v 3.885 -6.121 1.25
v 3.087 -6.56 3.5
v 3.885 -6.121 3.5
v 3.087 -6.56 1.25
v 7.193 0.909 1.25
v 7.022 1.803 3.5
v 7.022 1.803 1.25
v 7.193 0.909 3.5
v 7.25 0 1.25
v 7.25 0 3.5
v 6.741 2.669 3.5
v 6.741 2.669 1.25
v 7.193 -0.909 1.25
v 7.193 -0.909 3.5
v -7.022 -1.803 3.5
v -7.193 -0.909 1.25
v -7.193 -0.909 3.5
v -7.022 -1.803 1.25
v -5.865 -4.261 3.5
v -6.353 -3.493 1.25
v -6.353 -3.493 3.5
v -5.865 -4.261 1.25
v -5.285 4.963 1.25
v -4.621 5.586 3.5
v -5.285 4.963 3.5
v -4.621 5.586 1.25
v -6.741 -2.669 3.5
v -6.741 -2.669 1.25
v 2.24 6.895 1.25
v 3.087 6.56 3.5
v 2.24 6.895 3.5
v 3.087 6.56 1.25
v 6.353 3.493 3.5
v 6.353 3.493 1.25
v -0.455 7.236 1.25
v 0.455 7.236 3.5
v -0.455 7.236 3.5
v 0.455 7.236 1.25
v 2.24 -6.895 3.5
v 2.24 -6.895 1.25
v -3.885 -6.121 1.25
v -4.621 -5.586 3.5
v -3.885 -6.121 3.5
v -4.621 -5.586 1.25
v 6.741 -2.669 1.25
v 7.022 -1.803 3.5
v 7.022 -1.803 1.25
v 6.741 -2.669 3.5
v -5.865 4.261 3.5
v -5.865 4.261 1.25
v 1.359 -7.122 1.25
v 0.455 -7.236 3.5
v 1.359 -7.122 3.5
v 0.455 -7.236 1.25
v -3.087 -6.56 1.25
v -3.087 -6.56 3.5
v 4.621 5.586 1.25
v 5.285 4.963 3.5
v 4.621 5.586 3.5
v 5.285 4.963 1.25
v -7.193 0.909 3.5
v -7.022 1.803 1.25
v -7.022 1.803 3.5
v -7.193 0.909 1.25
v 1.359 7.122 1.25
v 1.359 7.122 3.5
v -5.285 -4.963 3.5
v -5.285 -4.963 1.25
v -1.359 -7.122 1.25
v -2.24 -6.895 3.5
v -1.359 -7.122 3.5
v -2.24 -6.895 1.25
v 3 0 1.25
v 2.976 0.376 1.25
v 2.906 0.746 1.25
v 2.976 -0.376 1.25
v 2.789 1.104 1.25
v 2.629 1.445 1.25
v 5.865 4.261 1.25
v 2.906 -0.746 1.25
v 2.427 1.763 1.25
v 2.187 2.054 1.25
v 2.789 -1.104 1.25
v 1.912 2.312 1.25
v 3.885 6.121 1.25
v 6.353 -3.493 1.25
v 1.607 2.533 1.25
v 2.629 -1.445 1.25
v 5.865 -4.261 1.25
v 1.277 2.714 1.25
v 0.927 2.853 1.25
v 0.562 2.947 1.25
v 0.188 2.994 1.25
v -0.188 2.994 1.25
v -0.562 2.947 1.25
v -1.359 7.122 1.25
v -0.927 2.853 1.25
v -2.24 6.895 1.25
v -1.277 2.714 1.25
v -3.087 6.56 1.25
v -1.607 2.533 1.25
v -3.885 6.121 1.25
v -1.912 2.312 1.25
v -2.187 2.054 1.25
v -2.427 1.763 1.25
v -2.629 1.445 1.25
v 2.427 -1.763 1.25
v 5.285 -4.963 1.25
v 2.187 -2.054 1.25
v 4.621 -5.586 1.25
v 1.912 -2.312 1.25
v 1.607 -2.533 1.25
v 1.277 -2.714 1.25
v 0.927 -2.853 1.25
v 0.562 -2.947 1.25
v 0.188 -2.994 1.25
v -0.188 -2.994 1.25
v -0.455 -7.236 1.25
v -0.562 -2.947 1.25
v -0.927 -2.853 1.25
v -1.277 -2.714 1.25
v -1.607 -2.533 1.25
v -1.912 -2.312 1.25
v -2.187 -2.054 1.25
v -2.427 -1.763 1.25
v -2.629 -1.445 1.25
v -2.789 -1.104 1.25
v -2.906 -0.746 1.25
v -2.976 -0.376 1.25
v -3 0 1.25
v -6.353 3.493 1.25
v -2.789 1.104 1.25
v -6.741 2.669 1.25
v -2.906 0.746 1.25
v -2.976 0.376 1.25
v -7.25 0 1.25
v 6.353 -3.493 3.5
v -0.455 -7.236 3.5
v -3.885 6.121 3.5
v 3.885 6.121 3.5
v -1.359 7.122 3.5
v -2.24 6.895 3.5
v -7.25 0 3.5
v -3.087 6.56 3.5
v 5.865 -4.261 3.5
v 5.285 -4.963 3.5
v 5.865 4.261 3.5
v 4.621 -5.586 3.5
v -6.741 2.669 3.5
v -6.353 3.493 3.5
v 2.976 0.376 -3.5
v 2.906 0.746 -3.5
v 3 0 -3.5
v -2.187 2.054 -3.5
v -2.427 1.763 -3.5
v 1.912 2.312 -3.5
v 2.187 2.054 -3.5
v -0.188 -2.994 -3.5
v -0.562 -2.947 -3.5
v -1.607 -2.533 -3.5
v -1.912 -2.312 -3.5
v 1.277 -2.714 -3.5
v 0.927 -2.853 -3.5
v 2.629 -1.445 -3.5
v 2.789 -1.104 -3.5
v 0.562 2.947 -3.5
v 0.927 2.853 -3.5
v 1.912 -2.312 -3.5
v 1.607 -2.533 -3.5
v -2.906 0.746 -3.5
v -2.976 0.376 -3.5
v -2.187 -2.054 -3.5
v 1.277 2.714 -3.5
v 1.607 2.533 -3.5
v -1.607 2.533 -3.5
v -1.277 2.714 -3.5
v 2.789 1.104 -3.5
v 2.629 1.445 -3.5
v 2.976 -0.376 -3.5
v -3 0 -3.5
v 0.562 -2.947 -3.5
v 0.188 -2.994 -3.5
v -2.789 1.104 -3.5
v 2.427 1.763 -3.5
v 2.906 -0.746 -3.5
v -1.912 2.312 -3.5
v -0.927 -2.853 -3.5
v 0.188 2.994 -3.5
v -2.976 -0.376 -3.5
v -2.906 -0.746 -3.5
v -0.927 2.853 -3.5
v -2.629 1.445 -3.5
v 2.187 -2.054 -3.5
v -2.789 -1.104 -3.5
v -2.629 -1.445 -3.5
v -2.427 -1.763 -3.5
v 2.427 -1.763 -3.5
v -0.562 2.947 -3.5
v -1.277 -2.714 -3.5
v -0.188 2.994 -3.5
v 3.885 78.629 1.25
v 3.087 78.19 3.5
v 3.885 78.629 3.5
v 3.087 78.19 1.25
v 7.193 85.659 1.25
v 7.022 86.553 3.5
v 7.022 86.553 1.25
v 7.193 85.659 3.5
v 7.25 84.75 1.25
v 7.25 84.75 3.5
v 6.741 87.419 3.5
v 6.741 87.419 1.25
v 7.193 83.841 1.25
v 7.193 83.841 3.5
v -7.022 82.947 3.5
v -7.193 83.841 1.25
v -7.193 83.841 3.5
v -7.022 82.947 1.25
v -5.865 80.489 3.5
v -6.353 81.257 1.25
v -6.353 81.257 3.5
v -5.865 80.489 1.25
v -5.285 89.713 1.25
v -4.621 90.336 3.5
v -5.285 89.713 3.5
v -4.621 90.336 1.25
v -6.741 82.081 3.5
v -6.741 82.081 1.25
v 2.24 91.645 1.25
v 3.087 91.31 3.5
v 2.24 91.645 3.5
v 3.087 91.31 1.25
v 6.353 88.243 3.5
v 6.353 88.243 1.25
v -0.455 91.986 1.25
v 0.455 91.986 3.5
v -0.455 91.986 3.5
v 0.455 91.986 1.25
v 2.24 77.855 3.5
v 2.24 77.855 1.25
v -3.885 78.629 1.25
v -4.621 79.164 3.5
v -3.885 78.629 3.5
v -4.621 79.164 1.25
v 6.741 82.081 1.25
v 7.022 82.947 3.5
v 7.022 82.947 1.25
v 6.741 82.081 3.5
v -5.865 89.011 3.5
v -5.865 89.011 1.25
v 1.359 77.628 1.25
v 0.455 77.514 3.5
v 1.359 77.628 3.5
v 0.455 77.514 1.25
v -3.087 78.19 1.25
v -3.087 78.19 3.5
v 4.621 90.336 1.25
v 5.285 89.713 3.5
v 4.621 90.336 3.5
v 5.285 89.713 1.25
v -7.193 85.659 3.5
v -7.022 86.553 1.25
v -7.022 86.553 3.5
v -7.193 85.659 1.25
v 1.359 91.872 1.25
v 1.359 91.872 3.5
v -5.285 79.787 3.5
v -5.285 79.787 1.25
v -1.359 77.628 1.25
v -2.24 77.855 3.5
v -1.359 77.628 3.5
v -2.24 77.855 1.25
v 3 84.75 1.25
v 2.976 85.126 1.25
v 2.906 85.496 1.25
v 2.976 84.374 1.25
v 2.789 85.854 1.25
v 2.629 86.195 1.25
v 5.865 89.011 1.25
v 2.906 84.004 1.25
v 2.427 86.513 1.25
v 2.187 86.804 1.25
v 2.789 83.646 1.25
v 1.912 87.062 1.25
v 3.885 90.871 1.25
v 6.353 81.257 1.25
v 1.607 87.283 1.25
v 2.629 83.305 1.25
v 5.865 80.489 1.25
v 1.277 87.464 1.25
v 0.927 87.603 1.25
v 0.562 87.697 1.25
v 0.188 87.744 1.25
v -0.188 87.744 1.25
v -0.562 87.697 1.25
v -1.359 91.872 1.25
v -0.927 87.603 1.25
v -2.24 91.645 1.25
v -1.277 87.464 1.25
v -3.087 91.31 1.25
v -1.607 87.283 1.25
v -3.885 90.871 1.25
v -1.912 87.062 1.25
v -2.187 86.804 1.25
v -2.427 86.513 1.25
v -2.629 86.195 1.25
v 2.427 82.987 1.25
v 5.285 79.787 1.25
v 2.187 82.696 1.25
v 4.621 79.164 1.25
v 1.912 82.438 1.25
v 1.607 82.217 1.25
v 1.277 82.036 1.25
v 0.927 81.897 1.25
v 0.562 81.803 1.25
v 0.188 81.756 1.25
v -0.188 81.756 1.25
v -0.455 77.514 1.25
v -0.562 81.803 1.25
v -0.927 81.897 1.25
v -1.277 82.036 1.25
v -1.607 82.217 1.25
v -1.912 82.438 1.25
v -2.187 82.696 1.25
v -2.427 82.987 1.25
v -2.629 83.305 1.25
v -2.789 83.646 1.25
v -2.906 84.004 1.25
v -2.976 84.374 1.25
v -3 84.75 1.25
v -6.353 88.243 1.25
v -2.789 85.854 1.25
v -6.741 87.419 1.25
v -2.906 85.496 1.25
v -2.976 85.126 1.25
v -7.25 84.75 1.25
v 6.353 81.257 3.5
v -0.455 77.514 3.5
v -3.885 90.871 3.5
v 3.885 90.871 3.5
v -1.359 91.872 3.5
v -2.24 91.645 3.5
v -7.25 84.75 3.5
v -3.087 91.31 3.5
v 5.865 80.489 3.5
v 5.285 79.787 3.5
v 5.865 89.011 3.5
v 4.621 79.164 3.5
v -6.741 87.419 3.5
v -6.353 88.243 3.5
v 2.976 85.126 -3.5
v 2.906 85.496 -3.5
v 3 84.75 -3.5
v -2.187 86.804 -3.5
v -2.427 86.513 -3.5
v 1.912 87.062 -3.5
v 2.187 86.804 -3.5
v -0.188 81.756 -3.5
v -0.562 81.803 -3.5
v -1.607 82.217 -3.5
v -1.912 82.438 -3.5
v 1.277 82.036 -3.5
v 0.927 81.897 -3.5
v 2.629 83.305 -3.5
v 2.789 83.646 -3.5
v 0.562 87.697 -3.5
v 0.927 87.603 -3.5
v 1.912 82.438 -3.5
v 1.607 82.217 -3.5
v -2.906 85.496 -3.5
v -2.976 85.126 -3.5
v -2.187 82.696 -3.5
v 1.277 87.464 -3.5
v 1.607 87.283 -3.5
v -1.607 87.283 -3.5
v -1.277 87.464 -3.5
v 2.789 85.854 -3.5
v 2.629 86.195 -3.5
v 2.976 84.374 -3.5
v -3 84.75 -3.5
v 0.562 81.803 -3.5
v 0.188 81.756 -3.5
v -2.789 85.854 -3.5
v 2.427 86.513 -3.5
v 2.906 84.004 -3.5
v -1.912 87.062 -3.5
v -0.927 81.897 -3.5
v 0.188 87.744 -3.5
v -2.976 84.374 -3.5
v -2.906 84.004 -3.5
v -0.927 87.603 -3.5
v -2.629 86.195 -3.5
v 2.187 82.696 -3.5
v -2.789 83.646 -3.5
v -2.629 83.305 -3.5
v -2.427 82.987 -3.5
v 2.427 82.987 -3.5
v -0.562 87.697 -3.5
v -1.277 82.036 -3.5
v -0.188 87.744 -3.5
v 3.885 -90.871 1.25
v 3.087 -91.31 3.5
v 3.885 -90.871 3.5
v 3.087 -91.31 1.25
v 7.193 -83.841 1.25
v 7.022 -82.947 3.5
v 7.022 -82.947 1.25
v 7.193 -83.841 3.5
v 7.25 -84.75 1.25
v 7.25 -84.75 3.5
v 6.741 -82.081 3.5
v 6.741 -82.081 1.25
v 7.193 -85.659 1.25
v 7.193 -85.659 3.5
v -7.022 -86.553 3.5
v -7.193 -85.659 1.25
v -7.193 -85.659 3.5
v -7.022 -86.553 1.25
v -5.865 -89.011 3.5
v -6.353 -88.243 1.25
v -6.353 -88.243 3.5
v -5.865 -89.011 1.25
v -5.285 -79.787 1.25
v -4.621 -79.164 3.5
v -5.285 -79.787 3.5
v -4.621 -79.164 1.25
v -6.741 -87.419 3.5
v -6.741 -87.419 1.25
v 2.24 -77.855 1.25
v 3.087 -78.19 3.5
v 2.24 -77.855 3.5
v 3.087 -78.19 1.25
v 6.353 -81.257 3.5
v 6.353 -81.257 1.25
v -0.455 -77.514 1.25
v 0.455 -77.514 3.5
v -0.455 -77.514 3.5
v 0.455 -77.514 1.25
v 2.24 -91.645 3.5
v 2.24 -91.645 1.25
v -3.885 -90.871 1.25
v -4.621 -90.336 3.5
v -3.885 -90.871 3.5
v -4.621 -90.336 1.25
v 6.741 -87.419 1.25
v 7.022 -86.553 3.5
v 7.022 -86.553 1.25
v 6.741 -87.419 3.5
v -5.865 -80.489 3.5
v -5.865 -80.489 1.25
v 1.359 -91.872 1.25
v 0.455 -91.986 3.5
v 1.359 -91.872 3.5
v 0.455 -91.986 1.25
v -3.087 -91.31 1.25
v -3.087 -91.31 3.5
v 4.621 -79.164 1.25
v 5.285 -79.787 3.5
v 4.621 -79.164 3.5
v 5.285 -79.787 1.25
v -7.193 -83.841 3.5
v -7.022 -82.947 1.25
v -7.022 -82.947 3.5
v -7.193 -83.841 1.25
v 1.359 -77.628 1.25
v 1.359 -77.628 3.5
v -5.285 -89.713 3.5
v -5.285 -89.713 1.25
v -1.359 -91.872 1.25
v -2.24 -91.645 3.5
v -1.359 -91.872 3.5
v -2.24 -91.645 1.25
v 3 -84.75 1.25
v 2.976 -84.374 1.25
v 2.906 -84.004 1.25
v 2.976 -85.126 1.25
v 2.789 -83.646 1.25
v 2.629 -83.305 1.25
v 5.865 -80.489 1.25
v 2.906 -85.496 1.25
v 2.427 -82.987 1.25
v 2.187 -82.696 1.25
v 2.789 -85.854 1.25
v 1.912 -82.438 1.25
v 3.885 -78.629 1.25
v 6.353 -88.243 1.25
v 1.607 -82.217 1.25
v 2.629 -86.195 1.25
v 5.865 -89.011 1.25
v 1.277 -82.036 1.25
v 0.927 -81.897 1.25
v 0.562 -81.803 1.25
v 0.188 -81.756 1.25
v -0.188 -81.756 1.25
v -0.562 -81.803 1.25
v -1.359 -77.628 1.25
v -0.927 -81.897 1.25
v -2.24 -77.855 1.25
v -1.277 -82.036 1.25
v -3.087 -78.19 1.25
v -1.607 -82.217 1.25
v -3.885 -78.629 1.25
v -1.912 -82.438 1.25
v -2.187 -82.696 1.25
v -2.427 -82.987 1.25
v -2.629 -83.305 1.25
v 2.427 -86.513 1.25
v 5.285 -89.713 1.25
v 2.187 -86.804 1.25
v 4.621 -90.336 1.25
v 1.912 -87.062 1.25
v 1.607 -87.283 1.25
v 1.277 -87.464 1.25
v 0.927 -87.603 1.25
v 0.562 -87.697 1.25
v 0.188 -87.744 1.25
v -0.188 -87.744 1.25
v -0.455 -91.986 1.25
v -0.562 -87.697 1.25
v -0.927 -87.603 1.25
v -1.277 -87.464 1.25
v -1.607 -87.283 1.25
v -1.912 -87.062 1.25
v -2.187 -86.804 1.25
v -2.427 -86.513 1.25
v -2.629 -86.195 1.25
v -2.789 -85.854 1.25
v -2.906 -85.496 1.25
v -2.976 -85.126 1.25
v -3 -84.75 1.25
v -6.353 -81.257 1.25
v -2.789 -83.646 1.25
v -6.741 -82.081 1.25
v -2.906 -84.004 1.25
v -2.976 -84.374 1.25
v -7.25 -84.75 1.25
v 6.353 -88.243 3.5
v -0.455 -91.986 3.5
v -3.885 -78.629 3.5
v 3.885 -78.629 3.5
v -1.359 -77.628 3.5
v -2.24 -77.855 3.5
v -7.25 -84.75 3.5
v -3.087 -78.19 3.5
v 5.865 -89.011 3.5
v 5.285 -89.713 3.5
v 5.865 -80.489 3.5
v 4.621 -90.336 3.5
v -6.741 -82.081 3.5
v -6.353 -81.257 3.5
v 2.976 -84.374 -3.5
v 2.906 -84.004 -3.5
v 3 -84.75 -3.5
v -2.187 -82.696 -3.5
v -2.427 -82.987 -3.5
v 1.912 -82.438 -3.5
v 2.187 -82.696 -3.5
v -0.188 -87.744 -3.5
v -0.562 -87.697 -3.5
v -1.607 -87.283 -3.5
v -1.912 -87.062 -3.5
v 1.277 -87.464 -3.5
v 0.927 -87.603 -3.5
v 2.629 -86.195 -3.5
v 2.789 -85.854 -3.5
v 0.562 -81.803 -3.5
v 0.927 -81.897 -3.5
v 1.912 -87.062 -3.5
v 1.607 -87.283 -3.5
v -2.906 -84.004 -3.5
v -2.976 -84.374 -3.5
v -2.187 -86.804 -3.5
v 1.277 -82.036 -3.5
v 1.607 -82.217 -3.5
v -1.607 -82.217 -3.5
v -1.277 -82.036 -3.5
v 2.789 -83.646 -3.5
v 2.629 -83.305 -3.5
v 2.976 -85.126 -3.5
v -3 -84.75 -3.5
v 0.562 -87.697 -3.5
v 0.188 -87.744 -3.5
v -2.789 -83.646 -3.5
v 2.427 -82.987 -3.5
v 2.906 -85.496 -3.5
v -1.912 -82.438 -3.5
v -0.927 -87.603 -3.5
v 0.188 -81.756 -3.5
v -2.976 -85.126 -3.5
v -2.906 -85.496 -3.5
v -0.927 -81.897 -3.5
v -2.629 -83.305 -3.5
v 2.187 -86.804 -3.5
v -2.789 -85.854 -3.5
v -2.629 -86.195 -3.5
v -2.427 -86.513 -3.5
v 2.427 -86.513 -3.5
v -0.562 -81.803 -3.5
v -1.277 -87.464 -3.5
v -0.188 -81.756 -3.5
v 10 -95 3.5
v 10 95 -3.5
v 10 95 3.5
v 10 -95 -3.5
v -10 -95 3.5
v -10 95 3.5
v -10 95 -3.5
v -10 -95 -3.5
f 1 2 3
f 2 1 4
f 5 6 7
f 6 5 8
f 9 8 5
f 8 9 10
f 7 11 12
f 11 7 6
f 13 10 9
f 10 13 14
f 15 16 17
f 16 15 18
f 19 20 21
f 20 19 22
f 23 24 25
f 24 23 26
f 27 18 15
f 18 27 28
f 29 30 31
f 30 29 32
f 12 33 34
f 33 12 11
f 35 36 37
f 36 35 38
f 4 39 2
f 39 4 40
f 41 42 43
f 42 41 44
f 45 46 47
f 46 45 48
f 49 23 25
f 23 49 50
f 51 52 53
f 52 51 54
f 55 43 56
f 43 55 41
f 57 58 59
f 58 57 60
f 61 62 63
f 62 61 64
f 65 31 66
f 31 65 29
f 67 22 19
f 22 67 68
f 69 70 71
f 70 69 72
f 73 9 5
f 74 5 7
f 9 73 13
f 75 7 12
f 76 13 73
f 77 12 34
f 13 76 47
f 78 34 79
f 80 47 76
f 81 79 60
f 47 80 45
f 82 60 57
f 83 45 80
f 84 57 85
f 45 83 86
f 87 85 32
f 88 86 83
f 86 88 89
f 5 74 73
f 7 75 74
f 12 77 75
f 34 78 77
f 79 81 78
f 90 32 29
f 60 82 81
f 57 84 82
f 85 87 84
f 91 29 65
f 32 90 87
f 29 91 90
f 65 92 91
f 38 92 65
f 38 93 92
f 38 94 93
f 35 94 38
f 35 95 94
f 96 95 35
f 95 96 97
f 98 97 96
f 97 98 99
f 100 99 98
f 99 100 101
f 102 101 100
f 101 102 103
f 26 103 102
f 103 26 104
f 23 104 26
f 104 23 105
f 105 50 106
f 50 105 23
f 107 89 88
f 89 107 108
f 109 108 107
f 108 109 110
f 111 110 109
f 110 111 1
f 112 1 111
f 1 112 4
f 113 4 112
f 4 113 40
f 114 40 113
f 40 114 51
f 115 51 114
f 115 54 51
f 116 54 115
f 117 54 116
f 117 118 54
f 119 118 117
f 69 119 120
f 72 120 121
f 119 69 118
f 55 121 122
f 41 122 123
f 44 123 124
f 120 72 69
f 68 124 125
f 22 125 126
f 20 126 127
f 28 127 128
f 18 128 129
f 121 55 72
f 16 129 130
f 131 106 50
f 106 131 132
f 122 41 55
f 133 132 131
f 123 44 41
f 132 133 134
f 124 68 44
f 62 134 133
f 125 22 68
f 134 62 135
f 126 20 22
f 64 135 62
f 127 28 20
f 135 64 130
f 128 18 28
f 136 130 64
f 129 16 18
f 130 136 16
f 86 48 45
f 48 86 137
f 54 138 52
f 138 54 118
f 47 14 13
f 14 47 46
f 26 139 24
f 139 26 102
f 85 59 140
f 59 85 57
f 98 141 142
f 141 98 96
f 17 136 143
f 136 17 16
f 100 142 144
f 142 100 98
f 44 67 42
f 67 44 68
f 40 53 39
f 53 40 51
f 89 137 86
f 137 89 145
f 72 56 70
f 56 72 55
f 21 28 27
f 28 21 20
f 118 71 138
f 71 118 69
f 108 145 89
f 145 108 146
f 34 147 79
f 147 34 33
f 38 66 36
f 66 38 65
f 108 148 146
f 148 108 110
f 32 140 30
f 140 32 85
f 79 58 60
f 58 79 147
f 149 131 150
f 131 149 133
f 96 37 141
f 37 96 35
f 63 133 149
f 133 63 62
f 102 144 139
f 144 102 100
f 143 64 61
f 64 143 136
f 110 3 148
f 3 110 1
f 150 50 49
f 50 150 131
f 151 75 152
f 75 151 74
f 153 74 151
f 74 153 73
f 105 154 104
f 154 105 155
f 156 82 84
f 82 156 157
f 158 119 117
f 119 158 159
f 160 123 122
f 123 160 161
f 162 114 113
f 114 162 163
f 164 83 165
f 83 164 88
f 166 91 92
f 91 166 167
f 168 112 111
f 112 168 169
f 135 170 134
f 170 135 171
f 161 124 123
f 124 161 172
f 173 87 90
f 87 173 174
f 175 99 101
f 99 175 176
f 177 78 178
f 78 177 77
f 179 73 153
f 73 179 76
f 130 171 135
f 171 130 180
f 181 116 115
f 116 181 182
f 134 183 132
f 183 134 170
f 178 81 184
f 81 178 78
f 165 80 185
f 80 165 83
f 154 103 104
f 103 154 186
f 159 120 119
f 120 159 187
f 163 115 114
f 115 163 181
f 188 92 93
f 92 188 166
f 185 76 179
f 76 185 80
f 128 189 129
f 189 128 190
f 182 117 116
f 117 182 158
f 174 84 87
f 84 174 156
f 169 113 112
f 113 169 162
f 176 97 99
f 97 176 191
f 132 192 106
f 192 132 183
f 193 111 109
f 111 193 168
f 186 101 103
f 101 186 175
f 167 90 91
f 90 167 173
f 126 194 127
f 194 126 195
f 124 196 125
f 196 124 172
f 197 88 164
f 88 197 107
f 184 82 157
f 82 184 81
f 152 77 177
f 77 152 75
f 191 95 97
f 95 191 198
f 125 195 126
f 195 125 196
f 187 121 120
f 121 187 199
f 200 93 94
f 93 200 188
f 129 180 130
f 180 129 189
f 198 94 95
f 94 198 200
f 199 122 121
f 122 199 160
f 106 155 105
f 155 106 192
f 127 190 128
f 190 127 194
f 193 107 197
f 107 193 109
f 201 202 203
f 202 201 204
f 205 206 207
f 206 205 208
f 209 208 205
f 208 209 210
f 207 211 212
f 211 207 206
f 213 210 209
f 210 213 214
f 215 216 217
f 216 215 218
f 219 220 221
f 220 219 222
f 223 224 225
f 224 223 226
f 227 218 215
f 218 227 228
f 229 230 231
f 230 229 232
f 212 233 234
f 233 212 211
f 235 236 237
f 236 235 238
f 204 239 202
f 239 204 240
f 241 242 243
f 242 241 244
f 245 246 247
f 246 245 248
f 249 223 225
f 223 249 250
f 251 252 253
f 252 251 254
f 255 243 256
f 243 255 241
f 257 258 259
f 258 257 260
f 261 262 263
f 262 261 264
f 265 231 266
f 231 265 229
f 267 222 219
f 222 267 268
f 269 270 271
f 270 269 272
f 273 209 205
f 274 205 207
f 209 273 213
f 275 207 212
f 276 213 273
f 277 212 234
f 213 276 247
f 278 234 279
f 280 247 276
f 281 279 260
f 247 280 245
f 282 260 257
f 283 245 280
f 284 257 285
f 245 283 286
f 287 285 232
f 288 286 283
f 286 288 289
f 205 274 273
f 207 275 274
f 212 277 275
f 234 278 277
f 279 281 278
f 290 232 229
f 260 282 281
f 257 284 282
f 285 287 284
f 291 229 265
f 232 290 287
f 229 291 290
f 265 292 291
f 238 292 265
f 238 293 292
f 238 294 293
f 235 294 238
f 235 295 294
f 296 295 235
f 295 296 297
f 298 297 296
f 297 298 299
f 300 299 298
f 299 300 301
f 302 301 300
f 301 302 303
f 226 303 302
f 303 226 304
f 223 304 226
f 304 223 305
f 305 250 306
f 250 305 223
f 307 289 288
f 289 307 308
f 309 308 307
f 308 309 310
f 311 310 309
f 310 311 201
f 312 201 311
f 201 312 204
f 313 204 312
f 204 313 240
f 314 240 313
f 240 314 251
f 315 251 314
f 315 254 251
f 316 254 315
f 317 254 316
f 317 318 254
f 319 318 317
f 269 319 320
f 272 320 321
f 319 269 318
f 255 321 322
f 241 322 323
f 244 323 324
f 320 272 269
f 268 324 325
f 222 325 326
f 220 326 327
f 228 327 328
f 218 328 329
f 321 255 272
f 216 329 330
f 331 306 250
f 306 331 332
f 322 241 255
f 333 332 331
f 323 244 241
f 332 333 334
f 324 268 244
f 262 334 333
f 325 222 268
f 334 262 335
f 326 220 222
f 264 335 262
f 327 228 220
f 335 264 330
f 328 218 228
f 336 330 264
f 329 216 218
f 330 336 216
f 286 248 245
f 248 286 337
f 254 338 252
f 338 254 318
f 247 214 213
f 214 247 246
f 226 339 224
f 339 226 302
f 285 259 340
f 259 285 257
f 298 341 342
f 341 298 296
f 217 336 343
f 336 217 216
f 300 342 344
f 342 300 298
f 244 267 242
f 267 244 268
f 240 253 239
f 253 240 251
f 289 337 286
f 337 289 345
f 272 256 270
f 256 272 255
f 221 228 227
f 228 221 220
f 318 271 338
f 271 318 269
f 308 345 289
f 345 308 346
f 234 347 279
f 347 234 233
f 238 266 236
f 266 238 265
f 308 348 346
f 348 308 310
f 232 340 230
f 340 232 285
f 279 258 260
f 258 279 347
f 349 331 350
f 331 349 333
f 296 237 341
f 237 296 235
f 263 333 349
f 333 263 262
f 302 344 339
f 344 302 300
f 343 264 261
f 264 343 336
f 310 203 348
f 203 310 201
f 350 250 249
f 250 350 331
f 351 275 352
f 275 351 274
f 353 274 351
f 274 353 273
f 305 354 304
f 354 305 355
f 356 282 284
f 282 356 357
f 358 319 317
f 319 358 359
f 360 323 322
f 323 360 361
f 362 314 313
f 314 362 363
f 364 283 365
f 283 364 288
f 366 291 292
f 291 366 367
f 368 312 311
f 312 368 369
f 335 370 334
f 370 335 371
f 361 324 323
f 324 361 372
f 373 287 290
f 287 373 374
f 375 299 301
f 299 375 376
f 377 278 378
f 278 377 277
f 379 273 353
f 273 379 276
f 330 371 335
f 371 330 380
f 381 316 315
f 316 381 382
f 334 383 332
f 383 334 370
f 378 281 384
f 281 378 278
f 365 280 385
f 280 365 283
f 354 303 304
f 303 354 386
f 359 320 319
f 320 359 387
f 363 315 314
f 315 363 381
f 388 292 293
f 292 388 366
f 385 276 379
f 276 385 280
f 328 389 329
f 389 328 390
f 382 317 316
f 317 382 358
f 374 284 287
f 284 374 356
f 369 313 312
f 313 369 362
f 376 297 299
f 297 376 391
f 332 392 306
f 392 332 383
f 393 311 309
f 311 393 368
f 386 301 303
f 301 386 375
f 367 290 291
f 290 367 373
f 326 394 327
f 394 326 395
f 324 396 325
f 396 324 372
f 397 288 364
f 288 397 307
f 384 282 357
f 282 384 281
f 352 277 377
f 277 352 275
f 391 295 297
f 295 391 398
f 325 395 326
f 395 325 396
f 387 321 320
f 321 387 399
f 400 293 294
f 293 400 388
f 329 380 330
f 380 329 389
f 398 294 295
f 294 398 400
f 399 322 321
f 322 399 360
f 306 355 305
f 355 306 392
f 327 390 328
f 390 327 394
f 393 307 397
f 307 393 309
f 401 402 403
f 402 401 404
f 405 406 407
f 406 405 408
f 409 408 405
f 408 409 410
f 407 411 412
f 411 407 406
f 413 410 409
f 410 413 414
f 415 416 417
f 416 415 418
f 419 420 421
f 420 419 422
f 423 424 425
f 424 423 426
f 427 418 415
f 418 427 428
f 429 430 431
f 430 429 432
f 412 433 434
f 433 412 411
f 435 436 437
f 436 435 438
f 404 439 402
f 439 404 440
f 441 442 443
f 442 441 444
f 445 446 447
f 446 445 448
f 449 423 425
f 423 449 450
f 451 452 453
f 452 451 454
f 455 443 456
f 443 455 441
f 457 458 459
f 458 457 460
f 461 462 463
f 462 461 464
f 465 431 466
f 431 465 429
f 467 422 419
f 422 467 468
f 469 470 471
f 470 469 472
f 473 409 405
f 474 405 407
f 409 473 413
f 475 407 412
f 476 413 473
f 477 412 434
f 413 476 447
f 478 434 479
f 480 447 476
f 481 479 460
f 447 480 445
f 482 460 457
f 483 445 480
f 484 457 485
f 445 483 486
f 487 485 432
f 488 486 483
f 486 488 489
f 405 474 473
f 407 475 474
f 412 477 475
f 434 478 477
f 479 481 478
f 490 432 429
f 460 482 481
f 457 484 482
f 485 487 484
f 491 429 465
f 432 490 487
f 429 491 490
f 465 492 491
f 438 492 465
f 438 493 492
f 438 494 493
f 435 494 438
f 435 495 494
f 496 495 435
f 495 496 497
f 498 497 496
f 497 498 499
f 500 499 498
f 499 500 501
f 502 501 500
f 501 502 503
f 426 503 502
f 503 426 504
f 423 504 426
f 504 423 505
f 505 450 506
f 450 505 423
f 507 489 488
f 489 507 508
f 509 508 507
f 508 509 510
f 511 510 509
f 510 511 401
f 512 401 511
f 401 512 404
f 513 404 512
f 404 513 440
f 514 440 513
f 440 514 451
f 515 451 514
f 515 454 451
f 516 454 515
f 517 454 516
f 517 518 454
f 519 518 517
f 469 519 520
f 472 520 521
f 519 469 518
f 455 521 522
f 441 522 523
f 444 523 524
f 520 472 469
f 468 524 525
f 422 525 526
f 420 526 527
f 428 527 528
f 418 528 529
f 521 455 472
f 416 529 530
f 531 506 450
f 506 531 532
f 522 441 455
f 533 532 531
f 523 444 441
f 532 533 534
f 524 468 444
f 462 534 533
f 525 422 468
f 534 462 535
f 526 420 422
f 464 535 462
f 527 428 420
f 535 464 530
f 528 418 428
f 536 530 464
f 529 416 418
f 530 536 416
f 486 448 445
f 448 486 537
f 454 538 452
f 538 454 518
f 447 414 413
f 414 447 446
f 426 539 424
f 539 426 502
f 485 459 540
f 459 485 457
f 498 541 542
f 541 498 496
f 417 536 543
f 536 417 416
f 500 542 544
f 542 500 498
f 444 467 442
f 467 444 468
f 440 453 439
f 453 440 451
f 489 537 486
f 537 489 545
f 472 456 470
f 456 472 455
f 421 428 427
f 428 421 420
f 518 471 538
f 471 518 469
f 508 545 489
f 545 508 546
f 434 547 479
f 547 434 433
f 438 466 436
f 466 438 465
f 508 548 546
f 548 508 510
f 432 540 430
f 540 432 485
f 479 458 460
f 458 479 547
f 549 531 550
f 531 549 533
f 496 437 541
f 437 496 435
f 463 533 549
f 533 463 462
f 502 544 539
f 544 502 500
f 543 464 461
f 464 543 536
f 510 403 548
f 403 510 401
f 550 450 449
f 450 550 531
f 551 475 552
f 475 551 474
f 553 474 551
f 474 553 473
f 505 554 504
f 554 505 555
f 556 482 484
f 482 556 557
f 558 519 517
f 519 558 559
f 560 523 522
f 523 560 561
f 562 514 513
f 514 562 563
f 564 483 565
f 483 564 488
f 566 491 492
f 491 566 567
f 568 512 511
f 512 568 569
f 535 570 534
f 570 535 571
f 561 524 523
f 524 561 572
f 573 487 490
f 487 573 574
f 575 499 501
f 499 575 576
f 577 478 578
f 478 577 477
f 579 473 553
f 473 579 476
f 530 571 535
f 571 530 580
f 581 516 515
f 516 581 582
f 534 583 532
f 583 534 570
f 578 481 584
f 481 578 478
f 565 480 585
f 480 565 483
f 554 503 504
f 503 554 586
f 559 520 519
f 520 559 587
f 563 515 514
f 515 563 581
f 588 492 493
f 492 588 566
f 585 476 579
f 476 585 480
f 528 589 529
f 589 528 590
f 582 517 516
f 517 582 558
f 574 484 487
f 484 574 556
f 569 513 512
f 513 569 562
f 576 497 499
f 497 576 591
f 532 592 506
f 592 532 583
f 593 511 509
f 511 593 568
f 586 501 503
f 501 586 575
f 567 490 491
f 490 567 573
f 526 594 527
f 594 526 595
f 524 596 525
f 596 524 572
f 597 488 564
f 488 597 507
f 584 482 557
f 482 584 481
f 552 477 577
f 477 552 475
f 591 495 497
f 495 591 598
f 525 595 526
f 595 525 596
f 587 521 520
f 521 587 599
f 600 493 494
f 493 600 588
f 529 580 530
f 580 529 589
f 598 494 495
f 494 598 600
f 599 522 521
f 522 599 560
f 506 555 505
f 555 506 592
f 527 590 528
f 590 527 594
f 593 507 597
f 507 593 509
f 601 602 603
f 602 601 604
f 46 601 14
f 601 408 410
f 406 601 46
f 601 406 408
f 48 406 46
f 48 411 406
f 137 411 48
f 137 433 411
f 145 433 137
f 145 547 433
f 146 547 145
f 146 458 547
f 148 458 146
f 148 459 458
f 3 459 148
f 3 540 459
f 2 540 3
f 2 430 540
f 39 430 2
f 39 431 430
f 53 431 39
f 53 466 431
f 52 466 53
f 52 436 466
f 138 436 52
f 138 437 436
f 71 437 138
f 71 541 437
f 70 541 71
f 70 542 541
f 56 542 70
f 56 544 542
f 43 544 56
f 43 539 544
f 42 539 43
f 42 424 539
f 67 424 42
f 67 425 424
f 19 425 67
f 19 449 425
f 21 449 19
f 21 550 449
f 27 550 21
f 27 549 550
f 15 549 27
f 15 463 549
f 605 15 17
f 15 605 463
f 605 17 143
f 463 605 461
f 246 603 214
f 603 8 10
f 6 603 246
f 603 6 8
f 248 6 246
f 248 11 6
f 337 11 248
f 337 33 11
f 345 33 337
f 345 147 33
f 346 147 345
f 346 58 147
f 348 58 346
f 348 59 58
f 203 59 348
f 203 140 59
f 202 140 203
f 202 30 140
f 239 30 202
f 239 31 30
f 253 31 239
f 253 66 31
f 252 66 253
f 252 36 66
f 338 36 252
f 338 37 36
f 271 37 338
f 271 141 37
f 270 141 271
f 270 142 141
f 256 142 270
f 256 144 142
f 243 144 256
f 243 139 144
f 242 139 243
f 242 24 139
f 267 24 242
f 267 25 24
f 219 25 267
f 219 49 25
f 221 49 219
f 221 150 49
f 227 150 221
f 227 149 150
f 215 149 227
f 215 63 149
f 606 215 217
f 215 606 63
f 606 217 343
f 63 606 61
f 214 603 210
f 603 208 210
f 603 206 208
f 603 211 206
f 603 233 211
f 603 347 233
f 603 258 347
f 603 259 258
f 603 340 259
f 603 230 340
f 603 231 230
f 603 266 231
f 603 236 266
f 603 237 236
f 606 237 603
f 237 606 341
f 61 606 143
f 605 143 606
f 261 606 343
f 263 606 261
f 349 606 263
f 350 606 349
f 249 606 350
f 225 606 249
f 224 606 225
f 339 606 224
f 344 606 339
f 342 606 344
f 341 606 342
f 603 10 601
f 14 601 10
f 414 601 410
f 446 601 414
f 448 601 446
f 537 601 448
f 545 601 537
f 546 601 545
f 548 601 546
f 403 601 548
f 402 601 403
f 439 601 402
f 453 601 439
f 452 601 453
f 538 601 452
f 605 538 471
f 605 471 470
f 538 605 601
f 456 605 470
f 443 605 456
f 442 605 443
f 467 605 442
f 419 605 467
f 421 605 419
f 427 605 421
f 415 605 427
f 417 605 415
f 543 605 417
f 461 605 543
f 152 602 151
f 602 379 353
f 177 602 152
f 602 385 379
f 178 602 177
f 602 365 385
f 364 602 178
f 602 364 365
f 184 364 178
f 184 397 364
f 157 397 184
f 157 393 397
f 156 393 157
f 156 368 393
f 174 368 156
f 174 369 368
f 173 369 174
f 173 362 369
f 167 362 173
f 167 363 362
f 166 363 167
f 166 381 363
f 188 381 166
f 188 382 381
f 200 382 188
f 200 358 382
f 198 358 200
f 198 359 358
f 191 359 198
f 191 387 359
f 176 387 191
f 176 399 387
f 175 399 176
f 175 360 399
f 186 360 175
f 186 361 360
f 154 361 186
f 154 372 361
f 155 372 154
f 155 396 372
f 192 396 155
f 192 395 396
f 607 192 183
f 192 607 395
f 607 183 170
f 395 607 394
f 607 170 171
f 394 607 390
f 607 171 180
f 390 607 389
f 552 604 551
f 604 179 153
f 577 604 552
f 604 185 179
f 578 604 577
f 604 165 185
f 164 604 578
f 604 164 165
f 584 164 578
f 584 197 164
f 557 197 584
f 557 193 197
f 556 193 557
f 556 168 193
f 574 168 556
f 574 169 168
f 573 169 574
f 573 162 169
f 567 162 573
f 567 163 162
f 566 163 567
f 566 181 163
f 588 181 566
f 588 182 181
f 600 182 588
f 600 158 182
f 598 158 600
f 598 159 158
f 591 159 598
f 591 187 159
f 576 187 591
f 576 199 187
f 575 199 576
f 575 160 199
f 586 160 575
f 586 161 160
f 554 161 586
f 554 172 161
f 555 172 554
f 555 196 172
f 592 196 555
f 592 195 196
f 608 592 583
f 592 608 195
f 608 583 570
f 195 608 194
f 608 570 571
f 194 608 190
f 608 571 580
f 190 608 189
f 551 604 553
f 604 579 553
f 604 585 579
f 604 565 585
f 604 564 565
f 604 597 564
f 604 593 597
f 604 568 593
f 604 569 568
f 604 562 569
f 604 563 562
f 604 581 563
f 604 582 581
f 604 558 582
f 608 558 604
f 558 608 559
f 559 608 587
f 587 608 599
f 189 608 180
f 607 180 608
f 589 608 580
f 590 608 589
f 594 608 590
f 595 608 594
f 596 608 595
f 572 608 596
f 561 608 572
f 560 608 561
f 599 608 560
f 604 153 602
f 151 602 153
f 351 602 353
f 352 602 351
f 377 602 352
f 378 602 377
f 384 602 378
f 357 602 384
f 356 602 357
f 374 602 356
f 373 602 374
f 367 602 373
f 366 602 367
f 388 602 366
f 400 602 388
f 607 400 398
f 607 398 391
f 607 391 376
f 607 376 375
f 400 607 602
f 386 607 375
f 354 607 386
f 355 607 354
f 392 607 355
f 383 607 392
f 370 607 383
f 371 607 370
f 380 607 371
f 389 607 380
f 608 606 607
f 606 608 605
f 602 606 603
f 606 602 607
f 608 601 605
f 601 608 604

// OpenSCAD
nutLipRad = 14.5/2;
nutLipZ = 2.25;

boltRad =  6/2; //6mm cropped greenhouse bolt

lateralOffset = 15;

centerBracketX = 20;
bracketX = 35;
bracketY = 190;
bracketZ = 7;

centerBracket();

$fn = 50;

module centerBracket()
{
    bracketSeg();
}

module bracketSeg()
{
    difference()
    {
        cube([centerBracketX,bracketY,bracketZ], center = true);
        translate([0,0,bracketZ/2-nutLipZ]){
            boltHole();
        }
        translate([0,bracketY/2-nutLipRad-3,bracketZ/2-nutLipZ]){
            boltHole();
        }
        translate([0,-bracketY/2+nutLipRad+3,bracketZ/2-nutLipZ]){
            boltHole();
        }
    } 
}

module boltHole()
{
    union()
    {
        cylinder(r = nutLipRad,h = nutLipZ+1);
        translate([0,0,-bracketZ])
            cylinder(r = boltRad, h = bracketZ+1);
    }
}
